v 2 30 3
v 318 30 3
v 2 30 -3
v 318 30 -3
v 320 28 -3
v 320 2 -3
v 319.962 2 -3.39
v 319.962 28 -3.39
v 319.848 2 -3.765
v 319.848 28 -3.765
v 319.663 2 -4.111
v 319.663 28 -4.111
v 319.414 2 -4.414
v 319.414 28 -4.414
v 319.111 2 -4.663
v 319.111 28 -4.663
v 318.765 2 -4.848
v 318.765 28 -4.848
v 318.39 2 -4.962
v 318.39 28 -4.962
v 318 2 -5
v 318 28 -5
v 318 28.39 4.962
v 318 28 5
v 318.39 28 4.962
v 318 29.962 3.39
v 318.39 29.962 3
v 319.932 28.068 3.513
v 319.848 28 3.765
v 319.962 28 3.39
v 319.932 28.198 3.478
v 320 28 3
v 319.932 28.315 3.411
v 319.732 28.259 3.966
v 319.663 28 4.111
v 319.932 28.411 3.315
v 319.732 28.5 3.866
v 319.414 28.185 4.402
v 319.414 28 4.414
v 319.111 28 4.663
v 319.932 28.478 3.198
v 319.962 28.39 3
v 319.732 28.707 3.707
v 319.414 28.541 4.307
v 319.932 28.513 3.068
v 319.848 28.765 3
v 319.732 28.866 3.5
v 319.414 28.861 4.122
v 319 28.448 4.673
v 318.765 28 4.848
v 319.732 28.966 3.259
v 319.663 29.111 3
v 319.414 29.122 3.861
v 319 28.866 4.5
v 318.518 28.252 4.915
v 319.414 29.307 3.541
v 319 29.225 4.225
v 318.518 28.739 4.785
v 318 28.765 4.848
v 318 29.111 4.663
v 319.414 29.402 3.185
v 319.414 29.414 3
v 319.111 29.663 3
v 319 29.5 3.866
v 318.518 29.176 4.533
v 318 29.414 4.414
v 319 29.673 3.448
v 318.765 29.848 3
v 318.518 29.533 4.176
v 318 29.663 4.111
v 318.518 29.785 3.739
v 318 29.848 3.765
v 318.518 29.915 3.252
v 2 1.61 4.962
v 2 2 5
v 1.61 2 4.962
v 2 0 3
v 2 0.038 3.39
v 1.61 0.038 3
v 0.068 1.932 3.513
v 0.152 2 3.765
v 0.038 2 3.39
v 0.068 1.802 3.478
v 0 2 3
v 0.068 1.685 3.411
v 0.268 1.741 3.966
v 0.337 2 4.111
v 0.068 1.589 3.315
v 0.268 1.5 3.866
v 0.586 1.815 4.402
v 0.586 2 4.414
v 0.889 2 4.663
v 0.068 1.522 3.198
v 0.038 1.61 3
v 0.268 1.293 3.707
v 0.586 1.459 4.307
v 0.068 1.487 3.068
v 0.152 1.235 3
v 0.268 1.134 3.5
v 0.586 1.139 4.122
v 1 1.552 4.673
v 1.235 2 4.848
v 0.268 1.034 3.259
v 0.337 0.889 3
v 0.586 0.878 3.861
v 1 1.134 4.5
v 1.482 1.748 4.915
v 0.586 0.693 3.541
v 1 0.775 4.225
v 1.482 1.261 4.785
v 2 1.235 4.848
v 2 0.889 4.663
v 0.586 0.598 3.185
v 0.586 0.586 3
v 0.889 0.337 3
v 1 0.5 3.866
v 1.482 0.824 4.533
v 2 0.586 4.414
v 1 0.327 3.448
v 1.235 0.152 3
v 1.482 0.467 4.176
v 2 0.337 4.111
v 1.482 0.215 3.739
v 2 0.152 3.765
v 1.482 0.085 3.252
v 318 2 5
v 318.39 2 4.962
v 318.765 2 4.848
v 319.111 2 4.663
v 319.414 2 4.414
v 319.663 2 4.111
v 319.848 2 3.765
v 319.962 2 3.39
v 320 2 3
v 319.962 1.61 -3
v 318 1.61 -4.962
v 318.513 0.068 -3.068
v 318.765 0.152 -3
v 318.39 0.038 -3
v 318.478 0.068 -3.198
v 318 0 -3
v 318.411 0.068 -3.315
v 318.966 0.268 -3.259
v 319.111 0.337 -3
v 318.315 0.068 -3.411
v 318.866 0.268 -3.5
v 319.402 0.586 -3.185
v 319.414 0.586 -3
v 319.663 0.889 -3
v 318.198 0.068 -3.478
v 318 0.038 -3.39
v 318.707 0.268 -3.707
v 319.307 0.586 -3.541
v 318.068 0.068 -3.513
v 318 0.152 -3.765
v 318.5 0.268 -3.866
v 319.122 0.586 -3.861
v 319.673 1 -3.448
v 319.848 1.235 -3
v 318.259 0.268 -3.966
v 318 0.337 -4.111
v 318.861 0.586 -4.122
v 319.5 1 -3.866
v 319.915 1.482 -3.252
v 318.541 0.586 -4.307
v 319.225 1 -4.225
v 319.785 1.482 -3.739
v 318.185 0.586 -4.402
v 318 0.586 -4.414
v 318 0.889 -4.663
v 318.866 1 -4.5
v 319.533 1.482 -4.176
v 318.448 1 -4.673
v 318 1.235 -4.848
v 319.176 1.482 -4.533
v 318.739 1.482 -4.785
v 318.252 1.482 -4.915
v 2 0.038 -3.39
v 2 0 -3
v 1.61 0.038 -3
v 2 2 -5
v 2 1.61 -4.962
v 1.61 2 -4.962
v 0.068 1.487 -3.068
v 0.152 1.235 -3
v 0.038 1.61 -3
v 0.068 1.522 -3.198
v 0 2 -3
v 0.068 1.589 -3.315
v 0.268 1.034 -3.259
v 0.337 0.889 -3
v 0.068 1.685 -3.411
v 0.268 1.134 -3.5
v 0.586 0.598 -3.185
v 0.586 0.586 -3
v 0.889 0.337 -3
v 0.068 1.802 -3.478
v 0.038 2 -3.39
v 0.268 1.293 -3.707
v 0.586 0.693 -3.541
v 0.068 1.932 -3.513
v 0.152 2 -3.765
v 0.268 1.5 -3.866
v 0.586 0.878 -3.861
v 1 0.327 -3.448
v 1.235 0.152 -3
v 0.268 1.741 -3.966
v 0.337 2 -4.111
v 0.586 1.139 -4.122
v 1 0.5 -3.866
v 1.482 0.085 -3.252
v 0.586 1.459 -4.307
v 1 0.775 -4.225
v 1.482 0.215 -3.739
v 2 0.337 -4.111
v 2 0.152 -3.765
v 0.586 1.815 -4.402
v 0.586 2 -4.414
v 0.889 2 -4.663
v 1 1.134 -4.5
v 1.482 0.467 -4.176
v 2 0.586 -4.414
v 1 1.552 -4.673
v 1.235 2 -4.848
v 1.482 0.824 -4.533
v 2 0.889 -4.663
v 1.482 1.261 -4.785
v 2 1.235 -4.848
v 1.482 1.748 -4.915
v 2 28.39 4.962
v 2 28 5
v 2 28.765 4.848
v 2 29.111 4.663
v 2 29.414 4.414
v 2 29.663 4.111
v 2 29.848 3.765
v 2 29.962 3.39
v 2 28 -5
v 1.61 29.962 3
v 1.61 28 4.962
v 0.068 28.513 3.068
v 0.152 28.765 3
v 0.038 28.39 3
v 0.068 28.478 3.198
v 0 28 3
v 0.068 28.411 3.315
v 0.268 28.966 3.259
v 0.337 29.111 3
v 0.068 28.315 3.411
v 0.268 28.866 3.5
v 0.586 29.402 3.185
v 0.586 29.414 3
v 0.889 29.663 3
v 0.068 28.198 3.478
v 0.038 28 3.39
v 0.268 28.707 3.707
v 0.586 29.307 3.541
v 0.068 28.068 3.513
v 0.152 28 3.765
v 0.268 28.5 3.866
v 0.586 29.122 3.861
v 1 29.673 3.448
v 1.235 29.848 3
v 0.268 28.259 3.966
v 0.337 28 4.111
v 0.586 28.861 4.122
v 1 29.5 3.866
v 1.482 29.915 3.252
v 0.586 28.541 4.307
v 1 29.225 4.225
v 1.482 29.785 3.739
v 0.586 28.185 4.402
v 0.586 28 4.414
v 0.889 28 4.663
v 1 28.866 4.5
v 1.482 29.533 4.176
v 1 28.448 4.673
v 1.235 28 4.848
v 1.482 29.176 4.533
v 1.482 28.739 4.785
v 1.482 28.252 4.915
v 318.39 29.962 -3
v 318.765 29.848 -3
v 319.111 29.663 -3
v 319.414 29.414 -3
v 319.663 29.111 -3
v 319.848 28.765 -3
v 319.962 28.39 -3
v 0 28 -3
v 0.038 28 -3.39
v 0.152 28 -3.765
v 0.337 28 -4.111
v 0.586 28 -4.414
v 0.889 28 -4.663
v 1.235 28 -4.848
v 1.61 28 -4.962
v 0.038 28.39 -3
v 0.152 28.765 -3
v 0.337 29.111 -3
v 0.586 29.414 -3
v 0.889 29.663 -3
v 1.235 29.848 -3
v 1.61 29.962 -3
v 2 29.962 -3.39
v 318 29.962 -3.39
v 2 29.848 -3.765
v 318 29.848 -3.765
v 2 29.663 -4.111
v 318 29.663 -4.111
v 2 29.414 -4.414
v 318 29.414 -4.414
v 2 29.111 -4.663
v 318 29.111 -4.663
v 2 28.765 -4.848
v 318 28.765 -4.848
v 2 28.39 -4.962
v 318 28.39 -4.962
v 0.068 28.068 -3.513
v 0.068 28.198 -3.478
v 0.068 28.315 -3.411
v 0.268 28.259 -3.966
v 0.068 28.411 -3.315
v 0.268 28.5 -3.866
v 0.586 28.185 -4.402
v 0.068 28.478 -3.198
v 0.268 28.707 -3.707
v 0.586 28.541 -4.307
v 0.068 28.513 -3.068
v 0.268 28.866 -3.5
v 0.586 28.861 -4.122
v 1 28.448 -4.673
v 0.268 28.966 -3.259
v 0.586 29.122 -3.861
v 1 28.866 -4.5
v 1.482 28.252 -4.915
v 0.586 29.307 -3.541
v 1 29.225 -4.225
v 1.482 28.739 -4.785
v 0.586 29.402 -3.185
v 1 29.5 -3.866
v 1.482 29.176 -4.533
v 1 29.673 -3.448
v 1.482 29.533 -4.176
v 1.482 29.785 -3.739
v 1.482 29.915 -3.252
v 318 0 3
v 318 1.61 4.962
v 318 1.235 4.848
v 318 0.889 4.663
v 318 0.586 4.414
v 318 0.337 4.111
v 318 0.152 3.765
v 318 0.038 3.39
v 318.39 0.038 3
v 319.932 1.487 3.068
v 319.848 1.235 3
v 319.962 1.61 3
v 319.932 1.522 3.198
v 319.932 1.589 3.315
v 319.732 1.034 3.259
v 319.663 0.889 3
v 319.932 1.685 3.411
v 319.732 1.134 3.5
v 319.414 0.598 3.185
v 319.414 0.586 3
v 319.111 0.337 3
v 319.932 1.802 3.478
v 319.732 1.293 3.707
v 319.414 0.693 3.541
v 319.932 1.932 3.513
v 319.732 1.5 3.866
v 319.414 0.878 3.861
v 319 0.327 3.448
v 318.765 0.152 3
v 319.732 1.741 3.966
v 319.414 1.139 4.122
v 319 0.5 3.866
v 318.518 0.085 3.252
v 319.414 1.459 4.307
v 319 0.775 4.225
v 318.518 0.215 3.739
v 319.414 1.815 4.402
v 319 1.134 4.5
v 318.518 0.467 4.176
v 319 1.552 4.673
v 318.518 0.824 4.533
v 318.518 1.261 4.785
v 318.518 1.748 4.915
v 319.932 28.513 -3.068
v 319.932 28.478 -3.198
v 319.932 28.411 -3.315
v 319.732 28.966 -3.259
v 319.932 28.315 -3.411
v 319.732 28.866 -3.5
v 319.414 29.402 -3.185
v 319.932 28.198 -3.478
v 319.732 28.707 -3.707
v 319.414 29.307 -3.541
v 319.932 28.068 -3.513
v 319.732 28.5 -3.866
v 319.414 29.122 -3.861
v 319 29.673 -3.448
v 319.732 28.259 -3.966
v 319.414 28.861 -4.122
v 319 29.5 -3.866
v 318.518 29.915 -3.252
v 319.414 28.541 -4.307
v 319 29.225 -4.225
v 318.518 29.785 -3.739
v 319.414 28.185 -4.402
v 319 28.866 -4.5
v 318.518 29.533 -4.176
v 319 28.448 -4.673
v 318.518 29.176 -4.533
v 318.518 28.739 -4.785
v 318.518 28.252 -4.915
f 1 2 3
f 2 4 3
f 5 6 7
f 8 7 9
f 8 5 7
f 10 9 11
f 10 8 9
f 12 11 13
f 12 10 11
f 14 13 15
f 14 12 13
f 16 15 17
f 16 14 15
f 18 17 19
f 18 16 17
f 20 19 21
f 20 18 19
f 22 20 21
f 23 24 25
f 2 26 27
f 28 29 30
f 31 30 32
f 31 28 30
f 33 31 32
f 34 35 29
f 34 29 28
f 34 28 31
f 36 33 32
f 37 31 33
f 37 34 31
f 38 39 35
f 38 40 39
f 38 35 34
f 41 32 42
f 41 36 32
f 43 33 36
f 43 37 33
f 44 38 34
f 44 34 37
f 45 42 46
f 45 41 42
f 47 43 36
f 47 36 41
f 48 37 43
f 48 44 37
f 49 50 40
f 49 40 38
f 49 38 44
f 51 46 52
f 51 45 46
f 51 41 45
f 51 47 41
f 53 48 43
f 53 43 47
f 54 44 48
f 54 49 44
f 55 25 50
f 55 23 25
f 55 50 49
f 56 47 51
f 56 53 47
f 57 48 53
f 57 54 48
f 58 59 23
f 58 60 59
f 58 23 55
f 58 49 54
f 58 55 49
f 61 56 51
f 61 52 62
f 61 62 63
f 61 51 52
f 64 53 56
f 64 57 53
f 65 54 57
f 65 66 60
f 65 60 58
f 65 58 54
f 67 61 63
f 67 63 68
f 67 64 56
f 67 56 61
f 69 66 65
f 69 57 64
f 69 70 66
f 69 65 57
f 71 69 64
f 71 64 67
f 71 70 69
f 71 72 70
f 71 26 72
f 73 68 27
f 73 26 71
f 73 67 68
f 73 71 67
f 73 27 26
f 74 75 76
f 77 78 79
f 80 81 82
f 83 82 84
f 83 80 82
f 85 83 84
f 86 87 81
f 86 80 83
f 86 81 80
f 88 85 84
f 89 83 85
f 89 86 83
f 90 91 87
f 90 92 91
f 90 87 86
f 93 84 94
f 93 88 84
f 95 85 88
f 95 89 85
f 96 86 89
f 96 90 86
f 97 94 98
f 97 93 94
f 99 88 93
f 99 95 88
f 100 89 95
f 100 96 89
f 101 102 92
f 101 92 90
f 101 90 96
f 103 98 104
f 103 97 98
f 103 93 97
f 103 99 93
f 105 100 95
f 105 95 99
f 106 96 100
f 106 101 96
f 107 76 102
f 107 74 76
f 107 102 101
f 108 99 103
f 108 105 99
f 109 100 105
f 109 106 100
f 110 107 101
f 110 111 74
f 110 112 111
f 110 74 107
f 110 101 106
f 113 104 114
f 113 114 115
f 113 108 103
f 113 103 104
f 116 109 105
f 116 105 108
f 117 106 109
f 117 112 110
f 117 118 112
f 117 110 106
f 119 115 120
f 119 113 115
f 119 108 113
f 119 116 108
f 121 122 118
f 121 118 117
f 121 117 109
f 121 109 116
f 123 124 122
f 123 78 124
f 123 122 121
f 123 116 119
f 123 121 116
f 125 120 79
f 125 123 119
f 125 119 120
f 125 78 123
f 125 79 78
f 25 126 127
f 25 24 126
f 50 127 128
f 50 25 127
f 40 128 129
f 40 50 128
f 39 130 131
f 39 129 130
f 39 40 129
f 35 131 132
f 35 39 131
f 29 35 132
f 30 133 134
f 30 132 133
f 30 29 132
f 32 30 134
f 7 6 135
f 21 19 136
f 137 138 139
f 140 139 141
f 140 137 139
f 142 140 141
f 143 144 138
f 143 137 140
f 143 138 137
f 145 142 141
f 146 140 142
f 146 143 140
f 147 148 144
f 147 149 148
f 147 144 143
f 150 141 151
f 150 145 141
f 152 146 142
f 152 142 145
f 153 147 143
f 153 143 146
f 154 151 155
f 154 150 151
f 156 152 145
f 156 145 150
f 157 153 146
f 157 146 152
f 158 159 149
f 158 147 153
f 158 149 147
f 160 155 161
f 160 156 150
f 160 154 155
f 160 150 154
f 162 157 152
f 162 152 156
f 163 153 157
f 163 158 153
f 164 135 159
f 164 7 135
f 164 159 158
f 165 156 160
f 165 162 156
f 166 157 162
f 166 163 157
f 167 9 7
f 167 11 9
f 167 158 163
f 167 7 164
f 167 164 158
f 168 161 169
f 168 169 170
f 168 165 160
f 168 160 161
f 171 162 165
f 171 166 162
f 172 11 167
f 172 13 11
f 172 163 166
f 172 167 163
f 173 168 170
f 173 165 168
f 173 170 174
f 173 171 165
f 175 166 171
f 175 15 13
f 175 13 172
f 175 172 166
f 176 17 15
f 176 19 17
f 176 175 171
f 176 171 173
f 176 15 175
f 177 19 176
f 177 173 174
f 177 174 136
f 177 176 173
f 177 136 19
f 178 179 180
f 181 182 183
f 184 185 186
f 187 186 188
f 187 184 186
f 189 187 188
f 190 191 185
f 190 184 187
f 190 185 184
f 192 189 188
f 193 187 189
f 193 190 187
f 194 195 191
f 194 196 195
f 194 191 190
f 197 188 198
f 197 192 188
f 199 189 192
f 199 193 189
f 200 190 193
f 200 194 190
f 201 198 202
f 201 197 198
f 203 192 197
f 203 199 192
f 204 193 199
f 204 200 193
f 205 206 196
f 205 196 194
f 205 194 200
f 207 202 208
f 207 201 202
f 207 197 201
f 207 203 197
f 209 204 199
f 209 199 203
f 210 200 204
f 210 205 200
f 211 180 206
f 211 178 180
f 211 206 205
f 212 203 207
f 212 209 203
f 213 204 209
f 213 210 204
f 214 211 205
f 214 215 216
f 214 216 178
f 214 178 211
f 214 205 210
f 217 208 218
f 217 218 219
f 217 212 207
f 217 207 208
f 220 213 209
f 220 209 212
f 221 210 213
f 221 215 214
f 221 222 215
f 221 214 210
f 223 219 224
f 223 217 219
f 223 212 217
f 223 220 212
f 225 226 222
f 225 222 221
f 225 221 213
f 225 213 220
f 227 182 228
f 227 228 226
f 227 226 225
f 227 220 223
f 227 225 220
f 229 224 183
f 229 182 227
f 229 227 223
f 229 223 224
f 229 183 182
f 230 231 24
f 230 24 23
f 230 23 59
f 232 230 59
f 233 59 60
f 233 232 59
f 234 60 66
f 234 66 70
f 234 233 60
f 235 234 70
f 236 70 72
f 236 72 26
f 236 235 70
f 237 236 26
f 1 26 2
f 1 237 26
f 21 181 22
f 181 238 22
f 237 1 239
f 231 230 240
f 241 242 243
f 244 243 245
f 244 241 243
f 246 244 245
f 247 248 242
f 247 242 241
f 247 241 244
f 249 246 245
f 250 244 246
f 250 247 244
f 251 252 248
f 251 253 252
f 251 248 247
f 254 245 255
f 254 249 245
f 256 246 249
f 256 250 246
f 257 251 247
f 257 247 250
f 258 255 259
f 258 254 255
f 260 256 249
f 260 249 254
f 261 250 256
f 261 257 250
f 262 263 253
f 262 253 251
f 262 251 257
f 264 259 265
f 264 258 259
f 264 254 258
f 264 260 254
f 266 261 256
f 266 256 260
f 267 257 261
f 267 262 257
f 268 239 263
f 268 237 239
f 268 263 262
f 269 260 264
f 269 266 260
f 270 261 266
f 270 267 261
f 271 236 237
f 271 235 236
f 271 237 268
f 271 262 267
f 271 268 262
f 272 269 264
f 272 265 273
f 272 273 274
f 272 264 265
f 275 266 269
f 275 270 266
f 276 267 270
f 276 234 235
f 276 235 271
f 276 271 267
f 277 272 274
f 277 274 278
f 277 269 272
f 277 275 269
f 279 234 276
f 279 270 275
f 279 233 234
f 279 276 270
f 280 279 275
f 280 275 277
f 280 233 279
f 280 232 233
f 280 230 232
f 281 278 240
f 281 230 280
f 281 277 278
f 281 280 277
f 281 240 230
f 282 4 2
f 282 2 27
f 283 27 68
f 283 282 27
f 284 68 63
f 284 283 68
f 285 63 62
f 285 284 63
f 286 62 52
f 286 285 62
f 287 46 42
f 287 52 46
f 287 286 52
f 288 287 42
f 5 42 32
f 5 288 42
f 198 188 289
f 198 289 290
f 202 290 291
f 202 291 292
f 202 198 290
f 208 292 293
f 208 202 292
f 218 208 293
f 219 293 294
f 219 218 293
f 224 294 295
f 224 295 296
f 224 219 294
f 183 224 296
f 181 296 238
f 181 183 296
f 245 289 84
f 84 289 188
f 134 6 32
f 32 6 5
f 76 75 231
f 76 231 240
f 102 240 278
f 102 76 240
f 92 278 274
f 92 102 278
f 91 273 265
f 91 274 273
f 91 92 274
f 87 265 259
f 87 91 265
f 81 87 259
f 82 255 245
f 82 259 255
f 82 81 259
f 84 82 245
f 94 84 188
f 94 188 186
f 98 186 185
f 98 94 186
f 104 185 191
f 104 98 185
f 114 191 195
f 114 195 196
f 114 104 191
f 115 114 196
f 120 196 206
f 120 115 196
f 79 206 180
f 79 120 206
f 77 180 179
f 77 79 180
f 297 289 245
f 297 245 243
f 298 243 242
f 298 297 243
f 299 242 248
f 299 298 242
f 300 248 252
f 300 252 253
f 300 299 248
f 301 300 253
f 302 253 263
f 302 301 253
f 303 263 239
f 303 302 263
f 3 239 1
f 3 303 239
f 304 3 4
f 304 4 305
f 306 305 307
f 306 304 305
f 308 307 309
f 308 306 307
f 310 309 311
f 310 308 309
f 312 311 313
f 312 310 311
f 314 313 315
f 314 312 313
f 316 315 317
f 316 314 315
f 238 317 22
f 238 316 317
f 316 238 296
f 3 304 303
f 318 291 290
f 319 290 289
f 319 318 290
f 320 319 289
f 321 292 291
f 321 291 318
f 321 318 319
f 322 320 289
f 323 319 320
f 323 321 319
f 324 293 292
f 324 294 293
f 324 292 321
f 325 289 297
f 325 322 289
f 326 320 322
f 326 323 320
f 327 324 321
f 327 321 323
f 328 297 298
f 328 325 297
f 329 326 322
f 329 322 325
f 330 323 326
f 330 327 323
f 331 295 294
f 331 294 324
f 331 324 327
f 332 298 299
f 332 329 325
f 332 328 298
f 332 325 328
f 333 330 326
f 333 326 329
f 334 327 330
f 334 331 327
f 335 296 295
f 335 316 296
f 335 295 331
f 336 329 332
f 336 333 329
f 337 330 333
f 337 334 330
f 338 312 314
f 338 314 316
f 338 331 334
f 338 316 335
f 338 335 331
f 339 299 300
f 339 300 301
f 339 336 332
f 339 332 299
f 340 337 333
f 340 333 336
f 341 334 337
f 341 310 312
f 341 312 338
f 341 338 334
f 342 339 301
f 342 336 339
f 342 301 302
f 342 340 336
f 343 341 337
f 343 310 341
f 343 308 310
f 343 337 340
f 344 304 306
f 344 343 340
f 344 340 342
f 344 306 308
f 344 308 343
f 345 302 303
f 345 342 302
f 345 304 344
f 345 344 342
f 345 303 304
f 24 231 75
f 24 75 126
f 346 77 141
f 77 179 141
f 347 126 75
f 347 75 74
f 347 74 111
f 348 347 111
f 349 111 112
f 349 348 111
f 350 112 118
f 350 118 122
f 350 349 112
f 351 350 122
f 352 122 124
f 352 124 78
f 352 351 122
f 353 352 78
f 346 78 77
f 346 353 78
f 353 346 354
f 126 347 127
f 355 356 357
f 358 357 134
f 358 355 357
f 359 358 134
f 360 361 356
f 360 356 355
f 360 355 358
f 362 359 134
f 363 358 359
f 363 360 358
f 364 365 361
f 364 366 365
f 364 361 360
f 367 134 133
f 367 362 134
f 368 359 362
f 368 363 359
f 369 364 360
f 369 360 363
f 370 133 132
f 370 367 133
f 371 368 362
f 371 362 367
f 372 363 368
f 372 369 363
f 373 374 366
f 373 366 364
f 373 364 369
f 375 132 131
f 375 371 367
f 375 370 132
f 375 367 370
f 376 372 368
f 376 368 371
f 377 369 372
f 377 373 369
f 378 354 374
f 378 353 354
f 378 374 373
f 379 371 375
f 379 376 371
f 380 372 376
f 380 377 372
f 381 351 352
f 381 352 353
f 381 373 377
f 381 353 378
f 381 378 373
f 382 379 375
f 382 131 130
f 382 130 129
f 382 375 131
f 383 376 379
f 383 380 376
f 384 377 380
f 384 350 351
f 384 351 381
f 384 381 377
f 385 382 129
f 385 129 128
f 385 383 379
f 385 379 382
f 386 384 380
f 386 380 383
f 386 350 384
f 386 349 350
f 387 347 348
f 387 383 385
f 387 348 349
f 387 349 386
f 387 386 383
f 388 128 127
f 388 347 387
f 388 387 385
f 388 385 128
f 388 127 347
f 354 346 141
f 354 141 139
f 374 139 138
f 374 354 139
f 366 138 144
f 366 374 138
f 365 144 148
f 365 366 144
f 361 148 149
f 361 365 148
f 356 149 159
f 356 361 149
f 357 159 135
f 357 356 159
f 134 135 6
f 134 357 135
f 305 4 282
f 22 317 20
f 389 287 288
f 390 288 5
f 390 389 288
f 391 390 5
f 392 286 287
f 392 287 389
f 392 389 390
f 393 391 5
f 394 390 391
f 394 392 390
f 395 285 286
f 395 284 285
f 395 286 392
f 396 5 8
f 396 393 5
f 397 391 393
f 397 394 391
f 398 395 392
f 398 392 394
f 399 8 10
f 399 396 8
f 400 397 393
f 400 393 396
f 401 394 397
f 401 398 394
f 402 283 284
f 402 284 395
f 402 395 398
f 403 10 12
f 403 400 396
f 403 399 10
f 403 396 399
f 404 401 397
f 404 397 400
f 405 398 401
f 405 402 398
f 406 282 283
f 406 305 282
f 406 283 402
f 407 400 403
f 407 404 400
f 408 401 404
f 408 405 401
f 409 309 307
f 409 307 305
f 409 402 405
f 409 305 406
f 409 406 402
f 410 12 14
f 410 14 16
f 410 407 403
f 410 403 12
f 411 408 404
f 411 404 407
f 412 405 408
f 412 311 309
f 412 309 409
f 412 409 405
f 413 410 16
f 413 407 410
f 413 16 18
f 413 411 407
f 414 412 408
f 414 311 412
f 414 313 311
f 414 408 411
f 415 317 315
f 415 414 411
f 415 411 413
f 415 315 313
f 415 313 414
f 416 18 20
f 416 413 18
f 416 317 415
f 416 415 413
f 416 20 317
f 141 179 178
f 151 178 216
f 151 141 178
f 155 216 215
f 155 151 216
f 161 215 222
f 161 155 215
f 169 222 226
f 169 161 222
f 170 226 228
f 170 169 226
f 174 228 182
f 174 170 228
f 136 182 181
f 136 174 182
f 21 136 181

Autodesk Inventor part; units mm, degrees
ref_plane "YZ Plane" through (0, 0, 0) normal (1, 0, 0) x (0, 1, 0)
ref_plane "XZ Plane" through (0, 0, 0) normal (0, 1, 0) x (-1, 0, 0)
ref_plane "XY Plane" through (0, 0, 0) normal (0, 0, 1) x (1, 0, 0)
sketch "Sketch1" plane through (0, 0, 0) normal (0, 0, 1) x (1, 0, 0)
  line L0 (0, 0) -> (320, 0)
  line L1 (320, 0) -> (320, 30)
  line L2 (320, 30) -> (0, 30)
  line L3 (0, 30) -> (0, 0)
  dimension "d0" = 320
  dimension "d1" = 30
extrude "Extrusion1" add sketch "Sketch1" along normal mid plane 10
fillet "Fillet1" radius 2 12 edges at (160, 30, 5) (160, 30, -5) (160, 0, 5) (320, 15, 5) (320, 15, -5) (320, 30, 0) (320, 0, 0) (160, 0, -5) (0, 30, 0) (0, 15, 5) (0, 15, -5) (0, 0, 0)
properties part number "Chassis base shaft"
